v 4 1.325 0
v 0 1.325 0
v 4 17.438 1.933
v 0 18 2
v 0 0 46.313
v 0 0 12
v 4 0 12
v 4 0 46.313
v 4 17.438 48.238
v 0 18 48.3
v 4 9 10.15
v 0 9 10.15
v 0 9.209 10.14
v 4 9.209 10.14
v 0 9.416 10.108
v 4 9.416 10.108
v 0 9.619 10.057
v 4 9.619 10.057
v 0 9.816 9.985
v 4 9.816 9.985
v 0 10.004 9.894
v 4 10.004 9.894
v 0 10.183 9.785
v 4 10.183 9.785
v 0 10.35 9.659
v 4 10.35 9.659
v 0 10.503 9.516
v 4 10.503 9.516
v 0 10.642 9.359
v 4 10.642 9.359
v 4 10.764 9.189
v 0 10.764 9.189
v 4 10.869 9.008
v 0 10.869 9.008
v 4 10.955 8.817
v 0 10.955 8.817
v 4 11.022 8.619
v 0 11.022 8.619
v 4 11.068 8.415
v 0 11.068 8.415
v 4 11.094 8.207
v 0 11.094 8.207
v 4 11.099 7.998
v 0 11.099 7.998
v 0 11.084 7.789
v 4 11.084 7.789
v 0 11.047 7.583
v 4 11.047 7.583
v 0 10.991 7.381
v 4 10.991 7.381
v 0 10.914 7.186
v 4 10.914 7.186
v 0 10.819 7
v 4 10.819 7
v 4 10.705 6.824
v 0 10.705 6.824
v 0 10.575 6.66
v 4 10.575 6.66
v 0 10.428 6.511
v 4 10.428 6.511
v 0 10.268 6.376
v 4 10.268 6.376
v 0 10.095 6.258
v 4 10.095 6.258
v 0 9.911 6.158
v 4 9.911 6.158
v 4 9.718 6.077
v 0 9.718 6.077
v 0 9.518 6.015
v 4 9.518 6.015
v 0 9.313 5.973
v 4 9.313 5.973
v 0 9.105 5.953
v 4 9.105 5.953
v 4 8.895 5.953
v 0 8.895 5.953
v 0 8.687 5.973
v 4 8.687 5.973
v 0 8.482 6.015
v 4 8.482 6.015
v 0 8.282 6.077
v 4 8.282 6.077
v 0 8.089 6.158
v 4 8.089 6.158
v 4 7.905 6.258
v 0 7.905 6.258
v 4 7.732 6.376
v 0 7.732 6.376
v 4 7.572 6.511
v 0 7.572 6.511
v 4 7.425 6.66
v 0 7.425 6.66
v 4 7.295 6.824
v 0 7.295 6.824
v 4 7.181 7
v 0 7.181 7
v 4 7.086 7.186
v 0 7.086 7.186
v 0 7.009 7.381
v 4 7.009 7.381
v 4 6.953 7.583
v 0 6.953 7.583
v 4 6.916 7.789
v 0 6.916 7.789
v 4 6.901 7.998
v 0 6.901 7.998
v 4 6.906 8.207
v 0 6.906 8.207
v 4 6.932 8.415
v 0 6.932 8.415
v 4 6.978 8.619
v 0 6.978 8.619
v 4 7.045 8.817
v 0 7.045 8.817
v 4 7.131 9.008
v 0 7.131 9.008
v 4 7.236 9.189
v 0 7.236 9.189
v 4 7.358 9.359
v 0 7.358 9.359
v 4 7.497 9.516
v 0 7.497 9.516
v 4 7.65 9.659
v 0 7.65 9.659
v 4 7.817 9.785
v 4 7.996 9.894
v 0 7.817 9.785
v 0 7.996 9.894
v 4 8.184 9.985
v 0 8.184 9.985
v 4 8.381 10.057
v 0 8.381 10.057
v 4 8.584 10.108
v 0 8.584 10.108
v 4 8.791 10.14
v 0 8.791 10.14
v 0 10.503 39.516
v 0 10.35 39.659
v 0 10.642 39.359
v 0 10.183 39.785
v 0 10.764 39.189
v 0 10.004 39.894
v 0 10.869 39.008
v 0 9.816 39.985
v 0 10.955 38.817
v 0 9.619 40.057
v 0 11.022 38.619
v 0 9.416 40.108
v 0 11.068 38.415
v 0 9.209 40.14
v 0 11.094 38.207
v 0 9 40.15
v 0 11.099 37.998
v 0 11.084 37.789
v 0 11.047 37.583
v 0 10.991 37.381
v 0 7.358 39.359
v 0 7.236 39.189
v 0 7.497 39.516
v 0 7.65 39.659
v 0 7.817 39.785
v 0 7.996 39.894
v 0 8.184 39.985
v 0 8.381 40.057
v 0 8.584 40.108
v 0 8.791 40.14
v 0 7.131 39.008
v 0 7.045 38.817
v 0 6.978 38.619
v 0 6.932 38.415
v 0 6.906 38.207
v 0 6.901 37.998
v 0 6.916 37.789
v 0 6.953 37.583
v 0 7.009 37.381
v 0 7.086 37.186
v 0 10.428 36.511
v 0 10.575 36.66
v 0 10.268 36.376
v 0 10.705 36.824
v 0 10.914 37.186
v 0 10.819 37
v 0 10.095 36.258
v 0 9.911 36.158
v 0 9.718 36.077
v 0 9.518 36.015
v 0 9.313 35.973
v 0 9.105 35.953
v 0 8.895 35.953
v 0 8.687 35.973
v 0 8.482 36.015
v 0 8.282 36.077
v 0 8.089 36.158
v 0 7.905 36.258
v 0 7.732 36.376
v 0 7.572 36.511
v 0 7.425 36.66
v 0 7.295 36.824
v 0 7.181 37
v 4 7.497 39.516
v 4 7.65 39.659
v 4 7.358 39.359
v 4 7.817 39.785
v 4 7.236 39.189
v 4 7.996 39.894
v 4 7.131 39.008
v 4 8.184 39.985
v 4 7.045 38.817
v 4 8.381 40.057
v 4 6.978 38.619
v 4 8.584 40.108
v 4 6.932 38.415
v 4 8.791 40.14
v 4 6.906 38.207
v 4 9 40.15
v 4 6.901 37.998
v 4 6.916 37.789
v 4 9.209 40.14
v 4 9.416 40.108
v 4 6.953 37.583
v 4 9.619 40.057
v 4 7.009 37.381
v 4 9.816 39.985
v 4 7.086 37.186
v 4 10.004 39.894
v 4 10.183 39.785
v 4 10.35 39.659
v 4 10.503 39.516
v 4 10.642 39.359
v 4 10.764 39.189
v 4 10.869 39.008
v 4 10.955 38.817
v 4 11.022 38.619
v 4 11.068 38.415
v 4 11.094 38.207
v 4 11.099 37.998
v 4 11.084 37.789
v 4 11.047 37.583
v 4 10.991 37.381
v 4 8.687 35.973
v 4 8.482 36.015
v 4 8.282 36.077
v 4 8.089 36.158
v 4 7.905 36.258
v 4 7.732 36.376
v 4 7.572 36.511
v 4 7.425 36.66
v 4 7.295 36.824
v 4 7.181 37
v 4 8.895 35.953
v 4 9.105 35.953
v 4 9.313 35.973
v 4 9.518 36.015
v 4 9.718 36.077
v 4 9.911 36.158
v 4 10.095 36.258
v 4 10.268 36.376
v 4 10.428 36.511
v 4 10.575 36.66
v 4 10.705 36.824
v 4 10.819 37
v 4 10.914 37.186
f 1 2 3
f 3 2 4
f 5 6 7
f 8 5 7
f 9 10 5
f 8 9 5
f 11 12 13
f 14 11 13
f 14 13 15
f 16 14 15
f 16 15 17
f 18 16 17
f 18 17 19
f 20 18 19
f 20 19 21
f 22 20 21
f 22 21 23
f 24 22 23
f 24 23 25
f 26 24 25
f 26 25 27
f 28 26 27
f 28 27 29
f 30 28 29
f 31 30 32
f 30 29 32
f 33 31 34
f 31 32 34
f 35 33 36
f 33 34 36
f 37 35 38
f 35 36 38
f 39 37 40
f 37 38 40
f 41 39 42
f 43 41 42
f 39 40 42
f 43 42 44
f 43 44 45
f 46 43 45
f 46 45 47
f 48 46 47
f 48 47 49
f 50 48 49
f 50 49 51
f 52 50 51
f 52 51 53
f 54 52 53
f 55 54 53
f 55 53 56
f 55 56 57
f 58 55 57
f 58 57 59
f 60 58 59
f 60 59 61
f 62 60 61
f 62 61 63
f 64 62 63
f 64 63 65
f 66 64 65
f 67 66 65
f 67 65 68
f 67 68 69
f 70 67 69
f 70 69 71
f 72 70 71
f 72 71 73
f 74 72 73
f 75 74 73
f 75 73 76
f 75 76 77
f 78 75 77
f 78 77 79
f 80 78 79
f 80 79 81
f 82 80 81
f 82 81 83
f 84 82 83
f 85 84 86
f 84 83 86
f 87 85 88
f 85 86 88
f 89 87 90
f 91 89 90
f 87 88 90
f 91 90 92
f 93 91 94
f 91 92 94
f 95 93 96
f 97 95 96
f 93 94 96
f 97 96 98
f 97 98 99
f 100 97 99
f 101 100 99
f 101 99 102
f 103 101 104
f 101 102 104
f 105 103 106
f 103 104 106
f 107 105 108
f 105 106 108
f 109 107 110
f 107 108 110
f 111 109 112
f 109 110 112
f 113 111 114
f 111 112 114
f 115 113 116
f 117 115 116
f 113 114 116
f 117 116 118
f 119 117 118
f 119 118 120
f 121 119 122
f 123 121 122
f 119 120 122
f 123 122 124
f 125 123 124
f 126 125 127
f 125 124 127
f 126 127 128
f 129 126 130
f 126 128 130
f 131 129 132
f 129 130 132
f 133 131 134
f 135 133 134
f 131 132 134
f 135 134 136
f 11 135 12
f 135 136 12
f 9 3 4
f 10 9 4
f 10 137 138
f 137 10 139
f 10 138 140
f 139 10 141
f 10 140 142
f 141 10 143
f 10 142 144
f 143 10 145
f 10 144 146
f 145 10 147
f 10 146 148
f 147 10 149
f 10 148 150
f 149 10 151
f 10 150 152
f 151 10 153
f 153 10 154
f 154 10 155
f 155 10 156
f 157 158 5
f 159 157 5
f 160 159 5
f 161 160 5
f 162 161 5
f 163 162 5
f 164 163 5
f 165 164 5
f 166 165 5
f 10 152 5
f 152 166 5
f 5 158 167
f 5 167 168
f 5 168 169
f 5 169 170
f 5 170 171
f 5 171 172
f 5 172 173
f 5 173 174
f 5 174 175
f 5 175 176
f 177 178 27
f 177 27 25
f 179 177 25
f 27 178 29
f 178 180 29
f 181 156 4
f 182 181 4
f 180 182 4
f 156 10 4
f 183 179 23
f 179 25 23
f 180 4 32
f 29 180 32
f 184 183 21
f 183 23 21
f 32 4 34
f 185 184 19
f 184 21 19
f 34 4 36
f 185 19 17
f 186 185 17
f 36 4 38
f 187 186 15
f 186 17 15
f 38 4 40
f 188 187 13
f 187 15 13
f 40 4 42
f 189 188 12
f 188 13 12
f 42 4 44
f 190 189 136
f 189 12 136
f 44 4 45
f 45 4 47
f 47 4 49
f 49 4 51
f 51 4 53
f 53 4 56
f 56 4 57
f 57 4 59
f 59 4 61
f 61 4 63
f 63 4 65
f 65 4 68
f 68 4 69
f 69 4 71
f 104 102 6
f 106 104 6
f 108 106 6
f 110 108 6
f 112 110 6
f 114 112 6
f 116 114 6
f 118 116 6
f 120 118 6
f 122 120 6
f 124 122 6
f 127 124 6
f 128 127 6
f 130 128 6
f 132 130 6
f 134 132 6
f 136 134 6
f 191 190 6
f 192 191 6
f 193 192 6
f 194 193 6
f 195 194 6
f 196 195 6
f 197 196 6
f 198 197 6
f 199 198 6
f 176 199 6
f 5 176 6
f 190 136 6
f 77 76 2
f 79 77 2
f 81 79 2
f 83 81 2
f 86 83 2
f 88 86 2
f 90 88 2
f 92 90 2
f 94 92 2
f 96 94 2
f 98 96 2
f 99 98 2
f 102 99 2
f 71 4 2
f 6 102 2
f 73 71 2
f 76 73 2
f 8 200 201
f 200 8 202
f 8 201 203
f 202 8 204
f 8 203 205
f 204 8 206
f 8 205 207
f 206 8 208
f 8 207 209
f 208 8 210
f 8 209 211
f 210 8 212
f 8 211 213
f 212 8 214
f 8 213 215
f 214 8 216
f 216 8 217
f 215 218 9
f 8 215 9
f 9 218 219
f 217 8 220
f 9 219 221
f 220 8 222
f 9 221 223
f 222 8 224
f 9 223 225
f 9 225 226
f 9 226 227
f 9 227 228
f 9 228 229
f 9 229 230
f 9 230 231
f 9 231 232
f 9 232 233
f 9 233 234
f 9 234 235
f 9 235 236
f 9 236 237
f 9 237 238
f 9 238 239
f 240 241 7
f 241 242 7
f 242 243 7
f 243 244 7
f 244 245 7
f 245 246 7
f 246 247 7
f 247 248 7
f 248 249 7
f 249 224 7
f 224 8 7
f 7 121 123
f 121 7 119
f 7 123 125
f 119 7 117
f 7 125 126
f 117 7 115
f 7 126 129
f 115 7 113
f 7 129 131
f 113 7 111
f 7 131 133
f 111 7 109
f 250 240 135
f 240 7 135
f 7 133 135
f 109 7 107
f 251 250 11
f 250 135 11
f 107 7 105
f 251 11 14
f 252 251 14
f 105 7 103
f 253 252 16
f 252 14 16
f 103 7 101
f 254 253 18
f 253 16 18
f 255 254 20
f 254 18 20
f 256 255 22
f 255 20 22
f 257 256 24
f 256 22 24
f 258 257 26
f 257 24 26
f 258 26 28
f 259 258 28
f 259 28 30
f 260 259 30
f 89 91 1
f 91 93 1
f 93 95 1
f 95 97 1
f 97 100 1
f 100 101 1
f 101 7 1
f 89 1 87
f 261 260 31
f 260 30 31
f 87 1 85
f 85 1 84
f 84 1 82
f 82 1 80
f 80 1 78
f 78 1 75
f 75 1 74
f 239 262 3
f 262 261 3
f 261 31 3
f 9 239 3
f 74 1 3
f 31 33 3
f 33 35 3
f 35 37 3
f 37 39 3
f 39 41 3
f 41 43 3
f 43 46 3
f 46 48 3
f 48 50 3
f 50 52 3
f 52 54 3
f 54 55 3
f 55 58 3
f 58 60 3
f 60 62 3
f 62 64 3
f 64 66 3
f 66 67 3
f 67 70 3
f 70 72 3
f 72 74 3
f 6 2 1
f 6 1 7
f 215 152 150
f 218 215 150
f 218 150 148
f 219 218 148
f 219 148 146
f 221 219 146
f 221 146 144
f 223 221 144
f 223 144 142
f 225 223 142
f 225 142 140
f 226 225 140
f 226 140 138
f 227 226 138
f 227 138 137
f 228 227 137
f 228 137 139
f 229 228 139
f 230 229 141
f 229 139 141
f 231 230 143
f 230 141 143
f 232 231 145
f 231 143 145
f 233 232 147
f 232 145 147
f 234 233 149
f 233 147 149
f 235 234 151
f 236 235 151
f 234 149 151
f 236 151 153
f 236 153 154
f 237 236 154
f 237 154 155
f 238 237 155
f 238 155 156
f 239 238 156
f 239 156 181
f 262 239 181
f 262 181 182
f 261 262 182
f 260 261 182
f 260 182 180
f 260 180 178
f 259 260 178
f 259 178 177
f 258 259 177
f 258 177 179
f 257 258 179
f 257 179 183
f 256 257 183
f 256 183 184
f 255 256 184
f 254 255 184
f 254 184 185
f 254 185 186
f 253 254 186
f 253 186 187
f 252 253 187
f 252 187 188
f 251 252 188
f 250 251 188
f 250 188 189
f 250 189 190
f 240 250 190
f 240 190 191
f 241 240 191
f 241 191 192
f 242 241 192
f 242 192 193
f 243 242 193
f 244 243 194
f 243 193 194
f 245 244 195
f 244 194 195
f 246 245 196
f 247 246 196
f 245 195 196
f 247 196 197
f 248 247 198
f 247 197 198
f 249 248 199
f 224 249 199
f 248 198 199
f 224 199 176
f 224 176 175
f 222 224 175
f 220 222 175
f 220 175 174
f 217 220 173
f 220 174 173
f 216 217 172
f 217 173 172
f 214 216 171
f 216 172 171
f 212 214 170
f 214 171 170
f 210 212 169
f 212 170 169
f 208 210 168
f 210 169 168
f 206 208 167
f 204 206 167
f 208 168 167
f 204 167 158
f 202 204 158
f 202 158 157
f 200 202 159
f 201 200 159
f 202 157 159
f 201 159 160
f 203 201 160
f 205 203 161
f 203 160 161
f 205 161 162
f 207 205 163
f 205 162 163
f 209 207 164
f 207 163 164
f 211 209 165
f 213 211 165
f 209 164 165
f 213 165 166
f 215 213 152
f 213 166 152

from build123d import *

# Parameters (mm, degrees)
EXTRUSION1_DEPTH  = 48.3
TROU_TARAUD_M51_D = 4.2
EXTRUSION2_DEPTH  = 52.7
EXTRUSION3_DEPTH  = 52.7


with BuildPart() as part:
    # Esquisse1 → Extrusion1 (new body)
    with BuildSketch(Plane.XY):
        Polygon((0, 0), (4, 0), (4, 17.437836661), (0, 18), align=None)
    extrude(amount=EXTRUSION1_DEPTH)

    # Trou taraudé M51 (through all)
    with Locations(Plane(origin=(4, 0, 0), x_dir=(0, 0, -1), z_dir=(1, 0, 0))):
        with Locations((-8.05, 9), (-38.05, 9)):
            Hole(TROU_TARAUD_M51_D / 2)

    # Esquisse4 → Extrusion2 (cut, through all)
    with BuildSketch(Plane.ZY):
        Polygon((48.3, 18), (46.312781499, 0), (48.3, 0), align=None)
        Polygon((0, 0), (0, 1.324812334), (12, 0), align=None)
    extrude(amount=-EXTRUSION2_DEPTH, mode=Mode.SUBTRACT)

    # Esquisse5 → Extrusion3 (cut, through all)
    with BuildSketch(Plane.ZY):
        Polygon((0, 1.324812334), (2, 18), (0, 18), align=None)
    extrude(amount=-EXTRUSION3_DEPTH, mode=Mode.SUBTRACT)


solid = part.part
